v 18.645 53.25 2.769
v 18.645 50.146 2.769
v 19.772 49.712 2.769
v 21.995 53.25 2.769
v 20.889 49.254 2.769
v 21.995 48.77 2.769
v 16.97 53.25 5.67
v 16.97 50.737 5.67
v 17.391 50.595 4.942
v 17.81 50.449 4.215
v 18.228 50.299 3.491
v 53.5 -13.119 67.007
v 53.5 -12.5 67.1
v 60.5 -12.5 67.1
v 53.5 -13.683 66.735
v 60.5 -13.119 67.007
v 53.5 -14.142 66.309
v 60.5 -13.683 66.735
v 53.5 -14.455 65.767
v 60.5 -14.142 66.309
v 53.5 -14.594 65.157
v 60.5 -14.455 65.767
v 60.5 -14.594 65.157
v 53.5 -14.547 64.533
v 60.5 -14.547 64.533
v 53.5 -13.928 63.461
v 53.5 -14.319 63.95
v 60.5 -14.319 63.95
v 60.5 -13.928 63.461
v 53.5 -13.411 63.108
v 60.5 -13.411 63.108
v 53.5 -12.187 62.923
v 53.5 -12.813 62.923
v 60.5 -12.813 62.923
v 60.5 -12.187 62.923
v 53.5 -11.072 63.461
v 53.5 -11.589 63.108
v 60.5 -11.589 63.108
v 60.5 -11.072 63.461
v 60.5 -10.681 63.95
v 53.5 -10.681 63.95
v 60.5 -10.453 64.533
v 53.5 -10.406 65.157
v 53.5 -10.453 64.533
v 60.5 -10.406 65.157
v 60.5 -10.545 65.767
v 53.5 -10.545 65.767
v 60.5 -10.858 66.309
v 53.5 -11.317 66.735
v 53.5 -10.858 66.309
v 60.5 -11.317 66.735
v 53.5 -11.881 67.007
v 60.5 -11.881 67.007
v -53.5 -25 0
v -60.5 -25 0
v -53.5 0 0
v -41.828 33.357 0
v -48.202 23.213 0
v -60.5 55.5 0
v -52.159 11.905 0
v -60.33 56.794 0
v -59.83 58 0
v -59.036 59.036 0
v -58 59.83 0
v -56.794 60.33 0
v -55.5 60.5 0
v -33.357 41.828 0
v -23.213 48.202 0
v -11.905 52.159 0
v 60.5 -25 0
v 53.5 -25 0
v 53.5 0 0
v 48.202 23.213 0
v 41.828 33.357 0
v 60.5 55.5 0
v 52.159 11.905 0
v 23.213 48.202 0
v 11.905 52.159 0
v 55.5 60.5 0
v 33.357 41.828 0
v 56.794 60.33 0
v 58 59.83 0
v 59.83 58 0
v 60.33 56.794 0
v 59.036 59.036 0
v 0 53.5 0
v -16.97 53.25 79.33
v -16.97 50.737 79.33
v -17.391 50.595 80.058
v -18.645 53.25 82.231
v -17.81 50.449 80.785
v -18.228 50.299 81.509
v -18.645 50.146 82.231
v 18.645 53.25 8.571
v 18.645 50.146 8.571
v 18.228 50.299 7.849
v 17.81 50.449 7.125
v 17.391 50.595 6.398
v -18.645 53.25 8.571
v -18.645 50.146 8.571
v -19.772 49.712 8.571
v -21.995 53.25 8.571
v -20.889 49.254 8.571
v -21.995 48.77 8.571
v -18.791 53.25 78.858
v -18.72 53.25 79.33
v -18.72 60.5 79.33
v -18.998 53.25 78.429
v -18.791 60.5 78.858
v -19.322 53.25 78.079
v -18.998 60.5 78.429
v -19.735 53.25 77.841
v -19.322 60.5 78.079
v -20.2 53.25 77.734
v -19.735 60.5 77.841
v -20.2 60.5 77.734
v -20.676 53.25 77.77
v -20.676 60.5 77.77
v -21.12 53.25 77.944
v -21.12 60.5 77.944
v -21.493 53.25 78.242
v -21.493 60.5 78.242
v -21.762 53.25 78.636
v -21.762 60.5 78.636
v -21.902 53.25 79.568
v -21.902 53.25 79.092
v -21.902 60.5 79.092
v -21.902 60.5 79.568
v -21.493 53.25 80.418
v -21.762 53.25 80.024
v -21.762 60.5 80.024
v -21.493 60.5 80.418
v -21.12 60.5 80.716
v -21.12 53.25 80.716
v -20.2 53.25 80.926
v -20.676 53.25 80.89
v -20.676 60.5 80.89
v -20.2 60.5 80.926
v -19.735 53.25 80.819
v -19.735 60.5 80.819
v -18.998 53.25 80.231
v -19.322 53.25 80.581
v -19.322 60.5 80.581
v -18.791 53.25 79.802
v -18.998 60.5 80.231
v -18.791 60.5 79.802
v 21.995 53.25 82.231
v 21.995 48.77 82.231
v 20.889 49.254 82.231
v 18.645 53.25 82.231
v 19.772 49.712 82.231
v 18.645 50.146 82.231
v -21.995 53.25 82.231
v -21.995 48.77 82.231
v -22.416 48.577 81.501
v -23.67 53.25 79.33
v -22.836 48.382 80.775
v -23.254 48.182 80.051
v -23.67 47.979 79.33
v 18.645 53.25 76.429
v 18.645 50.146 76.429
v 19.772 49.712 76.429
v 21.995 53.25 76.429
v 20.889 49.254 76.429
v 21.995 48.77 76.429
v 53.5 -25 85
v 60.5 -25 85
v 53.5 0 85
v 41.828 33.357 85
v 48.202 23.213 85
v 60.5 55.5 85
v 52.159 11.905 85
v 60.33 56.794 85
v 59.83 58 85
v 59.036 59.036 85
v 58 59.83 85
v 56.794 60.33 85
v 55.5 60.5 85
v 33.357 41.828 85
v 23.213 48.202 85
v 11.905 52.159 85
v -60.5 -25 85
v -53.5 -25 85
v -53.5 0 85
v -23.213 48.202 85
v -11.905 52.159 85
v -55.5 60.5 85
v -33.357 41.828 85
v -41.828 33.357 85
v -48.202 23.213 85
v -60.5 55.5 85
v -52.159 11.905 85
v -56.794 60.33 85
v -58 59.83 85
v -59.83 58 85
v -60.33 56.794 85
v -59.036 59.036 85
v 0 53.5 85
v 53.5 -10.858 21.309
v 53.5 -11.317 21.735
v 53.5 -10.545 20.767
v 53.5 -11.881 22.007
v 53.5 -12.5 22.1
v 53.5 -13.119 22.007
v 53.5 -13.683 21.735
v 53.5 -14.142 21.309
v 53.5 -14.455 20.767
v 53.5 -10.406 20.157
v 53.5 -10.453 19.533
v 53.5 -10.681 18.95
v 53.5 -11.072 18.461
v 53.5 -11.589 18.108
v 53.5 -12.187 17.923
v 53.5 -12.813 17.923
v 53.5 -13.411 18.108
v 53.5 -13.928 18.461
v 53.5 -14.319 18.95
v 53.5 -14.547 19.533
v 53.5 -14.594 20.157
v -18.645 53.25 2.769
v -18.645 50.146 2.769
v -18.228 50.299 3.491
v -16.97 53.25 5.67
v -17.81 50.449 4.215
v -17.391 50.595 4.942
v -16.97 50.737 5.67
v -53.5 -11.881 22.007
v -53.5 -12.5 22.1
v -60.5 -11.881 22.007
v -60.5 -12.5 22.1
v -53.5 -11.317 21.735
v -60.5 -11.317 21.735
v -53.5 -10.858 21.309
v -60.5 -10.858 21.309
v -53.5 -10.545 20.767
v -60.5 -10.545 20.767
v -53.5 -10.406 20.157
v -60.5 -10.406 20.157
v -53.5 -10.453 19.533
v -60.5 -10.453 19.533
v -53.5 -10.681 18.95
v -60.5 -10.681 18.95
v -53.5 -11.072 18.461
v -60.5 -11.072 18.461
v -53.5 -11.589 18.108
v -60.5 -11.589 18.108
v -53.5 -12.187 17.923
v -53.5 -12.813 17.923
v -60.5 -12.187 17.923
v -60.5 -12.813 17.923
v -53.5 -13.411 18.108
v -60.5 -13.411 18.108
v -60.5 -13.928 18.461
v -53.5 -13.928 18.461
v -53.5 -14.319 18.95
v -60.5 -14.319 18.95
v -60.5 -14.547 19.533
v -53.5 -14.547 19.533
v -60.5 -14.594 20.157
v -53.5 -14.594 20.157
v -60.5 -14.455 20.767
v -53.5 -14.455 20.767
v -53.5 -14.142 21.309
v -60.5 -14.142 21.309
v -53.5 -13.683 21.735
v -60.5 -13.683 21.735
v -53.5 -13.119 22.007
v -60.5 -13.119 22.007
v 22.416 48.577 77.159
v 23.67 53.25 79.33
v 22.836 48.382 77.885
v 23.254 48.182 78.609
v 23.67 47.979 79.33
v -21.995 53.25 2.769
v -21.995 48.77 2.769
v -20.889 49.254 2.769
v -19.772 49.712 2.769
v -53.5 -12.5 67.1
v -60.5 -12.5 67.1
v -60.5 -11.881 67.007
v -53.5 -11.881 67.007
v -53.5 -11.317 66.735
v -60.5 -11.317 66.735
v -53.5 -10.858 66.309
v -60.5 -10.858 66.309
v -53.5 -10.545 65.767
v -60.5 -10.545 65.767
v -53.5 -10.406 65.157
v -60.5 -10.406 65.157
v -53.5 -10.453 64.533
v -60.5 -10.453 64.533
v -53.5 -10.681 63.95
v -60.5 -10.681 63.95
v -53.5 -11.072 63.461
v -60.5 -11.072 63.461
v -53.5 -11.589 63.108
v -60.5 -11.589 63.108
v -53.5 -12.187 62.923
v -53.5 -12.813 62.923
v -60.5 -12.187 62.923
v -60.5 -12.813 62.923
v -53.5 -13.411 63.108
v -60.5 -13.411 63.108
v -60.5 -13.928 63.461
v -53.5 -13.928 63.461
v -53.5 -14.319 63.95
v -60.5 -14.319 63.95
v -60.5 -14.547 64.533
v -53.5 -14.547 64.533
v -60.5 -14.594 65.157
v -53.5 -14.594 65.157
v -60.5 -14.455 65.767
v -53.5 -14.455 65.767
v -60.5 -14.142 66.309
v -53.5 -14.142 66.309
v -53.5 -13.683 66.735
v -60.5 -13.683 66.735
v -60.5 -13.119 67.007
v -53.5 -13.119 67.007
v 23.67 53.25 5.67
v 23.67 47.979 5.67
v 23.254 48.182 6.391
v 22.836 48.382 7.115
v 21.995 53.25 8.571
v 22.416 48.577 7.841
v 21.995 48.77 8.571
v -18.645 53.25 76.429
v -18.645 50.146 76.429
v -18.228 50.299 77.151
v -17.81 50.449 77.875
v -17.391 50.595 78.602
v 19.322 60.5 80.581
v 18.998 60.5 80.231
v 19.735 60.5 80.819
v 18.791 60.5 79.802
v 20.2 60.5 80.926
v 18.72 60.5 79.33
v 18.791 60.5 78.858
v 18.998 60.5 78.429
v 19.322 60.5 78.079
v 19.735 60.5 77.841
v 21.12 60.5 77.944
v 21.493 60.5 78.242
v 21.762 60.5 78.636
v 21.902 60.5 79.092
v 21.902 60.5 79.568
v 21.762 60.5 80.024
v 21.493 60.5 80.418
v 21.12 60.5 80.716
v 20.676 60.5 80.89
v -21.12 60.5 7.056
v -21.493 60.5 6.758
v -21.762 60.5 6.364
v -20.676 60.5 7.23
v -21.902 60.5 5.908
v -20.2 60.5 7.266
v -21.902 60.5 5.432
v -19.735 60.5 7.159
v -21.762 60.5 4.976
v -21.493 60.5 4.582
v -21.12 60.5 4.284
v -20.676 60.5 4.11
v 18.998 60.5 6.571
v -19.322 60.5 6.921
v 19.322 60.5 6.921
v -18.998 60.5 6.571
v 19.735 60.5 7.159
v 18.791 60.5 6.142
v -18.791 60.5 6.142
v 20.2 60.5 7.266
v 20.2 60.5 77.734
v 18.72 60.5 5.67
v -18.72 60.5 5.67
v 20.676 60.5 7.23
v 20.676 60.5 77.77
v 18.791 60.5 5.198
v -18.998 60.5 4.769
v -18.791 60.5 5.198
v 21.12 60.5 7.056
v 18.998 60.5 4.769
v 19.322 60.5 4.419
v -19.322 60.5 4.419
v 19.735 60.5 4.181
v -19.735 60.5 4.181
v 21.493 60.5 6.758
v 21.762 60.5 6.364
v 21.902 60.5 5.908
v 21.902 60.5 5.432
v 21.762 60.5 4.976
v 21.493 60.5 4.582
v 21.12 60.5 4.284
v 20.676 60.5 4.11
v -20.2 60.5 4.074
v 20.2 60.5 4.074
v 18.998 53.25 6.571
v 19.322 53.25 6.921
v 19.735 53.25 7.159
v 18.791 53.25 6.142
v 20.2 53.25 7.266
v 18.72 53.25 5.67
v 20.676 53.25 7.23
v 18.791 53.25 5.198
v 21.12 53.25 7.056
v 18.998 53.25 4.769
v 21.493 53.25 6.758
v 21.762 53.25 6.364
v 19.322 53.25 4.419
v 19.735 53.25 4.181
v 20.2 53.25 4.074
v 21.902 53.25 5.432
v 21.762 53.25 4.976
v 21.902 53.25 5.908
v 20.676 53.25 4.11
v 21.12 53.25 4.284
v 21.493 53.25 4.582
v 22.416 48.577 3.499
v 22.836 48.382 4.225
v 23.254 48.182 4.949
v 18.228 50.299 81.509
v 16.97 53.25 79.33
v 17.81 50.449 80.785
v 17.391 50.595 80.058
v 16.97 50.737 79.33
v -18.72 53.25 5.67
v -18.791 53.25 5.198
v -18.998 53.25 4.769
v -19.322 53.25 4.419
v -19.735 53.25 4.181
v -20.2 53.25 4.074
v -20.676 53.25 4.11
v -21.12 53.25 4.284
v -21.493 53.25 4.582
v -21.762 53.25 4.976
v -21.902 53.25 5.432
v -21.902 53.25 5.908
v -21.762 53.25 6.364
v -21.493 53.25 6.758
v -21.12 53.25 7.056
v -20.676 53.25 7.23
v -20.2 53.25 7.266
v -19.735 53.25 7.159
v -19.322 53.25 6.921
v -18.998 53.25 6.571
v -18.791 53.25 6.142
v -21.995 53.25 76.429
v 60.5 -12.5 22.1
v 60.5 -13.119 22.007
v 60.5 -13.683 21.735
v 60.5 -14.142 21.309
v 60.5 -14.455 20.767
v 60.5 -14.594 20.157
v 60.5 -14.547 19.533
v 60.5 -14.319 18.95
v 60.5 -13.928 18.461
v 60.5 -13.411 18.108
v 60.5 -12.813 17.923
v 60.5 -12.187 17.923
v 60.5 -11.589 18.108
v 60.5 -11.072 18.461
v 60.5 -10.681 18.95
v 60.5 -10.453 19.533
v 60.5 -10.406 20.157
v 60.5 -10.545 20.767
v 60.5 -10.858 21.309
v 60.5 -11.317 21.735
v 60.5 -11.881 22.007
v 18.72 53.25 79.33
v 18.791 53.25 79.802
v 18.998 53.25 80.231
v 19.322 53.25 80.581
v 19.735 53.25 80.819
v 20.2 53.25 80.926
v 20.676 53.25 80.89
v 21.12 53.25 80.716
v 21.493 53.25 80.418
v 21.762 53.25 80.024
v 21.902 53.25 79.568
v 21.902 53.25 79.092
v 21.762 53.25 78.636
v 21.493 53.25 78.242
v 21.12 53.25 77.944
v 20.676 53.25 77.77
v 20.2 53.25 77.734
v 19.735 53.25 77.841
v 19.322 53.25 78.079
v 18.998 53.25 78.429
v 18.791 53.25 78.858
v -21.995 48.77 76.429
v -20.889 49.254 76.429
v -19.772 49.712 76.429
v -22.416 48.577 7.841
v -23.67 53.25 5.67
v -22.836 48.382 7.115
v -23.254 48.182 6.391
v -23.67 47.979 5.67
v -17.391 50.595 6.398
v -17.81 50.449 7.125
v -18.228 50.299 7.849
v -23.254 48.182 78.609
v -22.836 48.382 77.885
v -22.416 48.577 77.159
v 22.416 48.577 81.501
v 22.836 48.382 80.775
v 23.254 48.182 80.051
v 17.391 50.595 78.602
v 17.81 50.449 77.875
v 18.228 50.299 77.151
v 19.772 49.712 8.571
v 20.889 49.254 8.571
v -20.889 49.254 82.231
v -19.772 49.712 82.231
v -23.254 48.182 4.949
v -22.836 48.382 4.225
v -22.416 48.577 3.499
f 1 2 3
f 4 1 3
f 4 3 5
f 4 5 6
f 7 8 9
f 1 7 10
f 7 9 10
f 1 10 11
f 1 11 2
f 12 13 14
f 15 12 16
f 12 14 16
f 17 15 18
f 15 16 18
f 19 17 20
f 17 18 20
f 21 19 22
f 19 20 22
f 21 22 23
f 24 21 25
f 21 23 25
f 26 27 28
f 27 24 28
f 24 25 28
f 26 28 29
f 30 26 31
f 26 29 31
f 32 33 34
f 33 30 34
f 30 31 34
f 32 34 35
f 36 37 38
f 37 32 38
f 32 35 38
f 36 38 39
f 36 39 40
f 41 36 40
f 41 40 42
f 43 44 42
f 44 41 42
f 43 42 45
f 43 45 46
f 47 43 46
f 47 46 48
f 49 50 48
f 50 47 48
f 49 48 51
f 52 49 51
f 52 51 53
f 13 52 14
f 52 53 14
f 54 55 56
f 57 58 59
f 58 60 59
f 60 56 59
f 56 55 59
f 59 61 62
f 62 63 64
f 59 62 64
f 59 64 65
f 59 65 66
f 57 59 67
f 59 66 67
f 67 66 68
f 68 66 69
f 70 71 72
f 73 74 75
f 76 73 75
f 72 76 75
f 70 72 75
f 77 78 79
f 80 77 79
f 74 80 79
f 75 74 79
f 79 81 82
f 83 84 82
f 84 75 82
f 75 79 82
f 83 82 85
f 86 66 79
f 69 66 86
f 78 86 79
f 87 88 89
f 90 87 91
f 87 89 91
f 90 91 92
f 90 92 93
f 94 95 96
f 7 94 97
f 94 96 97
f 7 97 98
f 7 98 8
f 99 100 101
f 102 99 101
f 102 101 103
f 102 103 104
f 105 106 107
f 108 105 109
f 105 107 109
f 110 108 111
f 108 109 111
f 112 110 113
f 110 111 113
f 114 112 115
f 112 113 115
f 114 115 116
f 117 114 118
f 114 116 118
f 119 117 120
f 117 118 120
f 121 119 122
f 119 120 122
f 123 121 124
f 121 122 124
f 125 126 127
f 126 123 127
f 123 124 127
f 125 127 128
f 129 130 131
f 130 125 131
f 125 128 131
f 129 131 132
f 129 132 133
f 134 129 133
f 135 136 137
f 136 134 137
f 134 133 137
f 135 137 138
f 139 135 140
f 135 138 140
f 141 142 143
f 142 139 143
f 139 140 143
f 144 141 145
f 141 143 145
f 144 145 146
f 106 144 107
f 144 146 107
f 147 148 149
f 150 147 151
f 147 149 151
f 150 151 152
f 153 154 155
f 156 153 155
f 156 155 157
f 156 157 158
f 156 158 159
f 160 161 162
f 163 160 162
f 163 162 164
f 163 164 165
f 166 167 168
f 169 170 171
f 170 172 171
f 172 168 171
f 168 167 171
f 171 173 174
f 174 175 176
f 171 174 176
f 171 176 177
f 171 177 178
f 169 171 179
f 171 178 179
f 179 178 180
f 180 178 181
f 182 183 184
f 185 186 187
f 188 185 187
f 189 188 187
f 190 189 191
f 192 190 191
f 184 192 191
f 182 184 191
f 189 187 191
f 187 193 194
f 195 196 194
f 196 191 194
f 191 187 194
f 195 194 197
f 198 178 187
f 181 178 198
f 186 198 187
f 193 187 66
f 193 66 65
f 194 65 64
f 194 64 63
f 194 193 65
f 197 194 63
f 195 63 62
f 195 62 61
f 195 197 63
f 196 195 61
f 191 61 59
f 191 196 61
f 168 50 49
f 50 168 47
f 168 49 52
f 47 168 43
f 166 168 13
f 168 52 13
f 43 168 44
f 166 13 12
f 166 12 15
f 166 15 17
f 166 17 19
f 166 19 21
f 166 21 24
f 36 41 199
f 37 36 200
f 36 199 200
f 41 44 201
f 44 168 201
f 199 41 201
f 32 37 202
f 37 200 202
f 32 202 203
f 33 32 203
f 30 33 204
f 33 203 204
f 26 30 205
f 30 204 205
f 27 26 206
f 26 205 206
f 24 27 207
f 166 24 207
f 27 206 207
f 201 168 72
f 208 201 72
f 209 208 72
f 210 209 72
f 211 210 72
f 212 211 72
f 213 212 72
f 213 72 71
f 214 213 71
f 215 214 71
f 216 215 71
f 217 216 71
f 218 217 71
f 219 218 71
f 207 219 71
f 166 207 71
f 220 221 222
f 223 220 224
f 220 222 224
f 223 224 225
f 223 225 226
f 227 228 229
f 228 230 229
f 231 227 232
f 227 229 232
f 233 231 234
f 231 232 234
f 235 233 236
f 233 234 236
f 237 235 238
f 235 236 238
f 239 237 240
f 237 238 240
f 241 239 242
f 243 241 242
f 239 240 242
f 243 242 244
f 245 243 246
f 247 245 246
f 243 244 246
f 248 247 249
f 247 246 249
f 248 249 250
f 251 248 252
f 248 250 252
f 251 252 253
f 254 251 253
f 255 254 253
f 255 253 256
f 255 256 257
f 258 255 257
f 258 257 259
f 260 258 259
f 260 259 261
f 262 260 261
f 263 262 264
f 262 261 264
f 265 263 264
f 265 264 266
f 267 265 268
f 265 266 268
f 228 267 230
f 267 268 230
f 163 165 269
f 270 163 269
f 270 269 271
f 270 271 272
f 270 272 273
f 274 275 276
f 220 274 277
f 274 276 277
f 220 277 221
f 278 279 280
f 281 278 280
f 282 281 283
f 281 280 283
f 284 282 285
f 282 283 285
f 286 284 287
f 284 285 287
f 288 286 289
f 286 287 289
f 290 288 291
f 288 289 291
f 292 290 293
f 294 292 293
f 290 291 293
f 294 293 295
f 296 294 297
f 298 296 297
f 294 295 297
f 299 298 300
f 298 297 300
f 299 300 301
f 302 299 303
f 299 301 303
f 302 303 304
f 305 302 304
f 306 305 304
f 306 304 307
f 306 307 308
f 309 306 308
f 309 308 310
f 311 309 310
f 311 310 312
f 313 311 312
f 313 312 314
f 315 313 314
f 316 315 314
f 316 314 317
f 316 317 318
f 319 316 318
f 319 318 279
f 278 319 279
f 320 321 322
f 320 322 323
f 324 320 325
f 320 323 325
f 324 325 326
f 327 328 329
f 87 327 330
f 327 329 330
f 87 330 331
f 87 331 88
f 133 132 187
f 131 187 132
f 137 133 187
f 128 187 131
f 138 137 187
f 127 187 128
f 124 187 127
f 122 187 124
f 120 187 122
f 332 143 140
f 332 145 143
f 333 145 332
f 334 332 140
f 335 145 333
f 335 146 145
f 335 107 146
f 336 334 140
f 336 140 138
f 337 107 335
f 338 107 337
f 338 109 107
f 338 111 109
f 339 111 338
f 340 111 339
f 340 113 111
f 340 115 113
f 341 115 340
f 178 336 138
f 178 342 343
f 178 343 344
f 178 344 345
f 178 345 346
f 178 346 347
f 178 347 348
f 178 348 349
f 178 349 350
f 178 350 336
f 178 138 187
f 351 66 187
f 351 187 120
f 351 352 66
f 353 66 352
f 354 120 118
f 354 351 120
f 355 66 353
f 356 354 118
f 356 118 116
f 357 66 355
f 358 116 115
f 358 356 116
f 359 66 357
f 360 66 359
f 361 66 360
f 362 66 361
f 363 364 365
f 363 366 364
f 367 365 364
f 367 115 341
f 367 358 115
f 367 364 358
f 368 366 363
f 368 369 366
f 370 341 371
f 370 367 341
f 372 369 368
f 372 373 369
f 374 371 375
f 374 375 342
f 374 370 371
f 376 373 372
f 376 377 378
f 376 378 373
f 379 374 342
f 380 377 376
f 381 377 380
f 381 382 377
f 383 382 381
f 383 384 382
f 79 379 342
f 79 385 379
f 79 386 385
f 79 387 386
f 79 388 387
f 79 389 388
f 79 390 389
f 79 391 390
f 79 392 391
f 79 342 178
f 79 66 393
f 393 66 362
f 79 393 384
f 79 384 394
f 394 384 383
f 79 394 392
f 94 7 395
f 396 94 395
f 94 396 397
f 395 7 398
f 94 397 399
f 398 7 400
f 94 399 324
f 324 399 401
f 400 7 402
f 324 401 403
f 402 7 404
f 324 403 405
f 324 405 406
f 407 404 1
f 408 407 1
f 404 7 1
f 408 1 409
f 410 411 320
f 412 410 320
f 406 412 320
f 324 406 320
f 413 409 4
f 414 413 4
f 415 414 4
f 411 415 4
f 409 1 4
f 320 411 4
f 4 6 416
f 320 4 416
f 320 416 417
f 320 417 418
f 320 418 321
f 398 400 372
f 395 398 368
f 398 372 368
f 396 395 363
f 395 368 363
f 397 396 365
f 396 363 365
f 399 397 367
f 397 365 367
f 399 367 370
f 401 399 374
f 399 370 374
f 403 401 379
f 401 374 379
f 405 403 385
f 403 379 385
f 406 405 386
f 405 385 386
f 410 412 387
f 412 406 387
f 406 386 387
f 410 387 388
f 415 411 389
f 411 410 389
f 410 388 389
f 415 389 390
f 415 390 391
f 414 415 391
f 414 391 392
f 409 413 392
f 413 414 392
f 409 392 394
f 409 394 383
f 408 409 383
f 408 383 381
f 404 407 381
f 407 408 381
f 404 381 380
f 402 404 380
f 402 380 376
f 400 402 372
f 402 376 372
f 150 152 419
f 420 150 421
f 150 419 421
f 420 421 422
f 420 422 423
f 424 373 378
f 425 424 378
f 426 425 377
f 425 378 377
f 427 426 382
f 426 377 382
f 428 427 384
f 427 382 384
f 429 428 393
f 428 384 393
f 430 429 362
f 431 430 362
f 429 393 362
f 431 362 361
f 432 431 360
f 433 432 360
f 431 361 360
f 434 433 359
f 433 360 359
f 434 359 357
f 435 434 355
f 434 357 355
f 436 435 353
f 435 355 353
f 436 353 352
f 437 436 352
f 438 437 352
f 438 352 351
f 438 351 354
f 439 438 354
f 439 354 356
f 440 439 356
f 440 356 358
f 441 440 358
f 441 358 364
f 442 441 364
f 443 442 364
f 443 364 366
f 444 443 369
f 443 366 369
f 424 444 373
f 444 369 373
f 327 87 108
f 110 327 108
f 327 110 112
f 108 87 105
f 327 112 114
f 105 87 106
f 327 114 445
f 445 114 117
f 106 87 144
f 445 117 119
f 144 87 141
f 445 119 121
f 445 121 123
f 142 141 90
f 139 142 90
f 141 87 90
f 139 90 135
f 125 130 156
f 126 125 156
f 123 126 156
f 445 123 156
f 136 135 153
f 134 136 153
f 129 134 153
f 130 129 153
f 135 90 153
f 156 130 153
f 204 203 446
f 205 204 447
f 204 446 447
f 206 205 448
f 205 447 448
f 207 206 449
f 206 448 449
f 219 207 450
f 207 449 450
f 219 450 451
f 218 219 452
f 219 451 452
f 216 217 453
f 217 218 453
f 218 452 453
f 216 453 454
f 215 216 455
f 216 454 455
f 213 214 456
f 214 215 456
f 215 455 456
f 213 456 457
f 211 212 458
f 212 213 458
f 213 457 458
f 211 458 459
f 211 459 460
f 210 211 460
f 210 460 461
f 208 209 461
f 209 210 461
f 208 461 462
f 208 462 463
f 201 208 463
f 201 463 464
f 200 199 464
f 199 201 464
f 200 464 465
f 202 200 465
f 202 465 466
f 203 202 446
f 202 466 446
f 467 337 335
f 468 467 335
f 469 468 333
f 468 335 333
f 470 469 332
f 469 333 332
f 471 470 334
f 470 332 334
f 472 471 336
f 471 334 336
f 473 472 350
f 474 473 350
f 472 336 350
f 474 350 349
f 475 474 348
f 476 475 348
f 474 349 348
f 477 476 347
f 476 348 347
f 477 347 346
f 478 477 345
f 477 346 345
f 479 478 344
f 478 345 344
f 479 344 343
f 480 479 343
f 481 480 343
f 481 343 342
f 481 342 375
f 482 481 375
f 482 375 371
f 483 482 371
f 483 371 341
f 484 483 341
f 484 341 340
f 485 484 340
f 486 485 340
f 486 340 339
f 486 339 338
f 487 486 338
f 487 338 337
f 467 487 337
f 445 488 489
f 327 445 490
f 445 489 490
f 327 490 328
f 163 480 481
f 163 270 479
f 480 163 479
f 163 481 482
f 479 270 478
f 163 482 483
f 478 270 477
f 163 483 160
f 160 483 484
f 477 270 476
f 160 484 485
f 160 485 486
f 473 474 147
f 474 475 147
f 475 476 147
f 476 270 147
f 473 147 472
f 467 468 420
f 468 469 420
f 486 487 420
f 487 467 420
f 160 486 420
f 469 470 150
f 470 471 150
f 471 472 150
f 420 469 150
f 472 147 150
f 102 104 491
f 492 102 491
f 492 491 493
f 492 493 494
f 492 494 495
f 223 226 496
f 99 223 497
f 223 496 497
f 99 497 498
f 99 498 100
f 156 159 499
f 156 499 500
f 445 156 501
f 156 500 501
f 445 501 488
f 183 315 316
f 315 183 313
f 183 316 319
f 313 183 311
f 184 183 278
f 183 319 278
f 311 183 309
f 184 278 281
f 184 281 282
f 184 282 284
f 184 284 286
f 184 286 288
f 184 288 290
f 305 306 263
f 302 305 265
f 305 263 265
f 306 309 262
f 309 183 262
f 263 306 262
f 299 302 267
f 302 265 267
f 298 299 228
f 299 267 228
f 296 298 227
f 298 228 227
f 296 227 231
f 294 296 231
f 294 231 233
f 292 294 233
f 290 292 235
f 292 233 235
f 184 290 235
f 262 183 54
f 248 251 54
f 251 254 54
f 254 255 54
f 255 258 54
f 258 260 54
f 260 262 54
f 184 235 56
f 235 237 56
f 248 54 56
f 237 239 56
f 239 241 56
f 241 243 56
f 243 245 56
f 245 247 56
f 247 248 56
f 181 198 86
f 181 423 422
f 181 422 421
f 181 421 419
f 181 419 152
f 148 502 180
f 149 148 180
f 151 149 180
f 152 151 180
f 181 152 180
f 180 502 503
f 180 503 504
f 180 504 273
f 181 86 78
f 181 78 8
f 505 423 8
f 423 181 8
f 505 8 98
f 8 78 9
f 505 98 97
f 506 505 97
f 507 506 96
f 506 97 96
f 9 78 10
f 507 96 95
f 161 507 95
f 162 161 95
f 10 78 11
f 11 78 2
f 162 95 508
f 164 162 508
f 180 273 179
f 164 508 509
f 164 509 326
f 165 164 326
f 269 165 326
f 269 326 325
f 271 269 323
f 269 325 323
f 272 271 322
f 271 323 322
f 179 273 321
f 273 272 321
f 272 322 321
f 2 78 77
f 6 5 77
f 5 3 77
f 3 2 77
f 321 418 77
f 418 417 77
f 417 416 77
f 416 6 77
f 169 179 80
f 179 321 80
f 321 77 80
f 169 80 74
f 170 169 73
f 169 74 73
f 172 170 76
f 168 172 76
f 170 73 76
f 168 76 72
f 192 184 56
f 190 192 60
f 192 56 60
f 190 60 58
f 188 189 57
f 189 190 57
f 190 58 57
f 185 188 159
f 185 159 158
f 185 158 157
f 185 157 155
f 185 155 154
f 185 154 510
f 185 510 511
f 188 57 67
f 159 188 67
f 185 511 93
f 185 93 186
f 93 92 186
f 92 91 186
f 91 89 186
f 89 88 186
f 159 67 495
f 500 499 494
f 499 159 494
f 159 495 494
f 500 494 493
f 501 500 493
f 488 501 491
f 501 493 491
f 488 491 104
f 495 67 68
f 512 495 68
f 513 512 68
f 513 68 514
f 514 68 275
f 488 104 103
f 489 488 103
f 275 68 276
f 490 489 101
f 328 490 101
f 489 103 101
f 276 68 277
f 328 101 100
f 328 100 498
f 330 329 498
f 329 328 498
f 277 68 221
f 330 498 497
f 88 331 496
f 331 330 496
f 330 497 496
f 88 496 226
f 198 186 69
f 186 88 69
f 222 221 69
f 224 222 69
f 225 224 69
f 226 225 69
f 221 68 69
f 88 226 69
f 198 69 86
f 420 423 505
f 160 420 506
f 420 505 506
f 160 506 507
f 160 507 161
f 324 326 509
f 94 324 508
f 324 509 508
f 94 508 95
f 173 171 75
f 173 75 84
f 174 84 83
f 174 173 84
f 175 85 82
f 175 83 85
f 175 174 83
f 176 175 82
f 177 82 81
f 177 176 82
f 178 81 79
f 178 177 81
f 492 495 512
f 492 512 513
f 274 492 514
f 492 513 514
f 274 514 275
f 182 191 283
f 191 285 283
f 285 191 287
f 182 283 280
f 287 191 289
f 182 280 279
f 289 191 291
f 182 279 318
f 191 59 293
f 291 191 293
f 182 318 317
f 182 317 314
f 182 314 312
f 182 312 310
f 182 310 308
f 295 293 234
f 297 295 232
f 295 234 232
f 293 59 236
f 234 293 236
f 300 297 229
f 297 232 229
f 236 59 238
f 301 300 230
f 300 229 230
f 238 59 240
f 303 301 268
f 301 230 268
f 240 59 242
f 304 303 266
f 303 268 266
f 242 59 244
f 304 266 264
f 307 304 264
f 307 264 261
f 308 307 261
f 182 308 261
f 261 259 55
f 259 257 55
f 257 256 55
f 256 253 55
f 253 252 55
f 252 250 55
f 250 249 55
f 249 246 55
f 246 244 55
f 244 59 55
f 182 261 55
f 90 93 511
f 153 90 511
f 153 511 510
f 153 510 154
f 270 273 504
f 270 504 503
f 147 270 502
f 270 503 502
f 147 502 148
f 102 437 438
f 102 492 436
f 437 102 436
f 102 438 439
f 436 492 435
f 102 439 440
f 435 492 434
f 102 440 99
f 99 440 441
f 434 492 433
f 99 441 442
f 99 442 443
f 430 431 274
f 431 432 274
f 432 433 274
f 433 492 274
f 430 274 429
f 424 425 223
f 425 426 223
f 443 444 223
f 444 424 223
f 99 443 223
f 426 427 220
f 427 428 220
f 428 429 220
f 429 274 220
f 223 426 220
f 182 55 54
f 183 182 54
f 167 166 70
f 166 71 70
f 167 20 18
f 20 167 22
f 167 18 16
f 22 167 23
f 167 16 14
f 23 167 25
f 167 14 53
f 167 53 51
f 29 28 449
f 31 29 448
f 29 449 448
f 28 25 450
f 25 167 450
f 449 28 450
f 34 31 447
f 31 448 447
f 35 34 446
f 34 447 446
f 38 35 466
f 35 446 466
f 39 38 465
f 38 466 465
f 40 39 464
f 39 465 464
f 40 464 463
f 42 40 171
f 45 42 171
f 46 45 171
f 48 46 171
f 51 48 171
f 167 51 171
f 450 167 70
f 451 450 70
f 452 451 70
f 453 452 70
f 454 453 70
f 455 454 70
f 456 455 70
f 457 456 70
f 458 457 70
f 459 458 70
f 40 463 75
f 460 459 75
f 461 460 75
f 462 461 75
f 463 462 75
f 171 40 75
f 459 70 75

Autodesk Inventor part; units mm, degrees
ref_plane "YZ Plane" through (0, 0, 0) normal (1, 0, 0) x (0, 1, 0)
ref_plane "XZ Plane" through (0, 0, 0) normal (0, 1, 0) x (-1, 0, 0)
ref_plane "XY Plane" through (0, 0, 0) normal (0, 0, 1) x (1, 0, 0)
sketch "スケッチ1" plane through (0, 0, 0) normal (0, 0, 1) x (1, 0, 0)
  arc A0 (0, 53.5) -> (-53.5, 0) centre (0, 0) ccw
  line L0 (-60.5, 0) -> (-60.5, 60.5)
  line L1 (-60.5, 60.5) -> (0, 60.5)
  line L2 (0, 60.5) -> (0, -99.4363)
  line L3 (-60.5, 0) -> (-60.5, -25)
  line L4 (-60.5, -25) -> (-53.5, -25)
  line L5 (-53.5, -25) -> (-53.5, 0)
  dimension "d0" = 107
  dimension "d3" = 25
extrude "押し出し1" add sketch "スケッチ1" along normal blind 85
sketch "スケッチ2" plane through (-60.5, 60.5, 0) normal (0, 1, 0) x (1, 0, 0)
  line L0 (60.5, -85) -> (7, -85) projected
  line L1 (60.5, -85) -> (60.5, -42.5)
  line L2 (60.5, 0) -> (60.5, -85) projected
  line L3 (60.5, -42.5) -> (40.18, -42.5)
  line L4 (40.18, -42.5) -> (40.18, -5.67)
  line L5 (40.18, -42.5) -> (40.18, -79.33)
  circle A0 centre (40.18, -5.67) radius 1.6
  circle A1 centre (40.18, -79.33) radius 1.6
  line L6 (60.5, -42.5) -> (-11.6627, -42.5)
  line L7 (-11.6627, -42.5) -> (-11.6627, -99.0684)
  line L8 (-11.6627, -99.0684) -> (60.5, -99.0684)
  line L9 (60.5, -99.0684) -> (60.5, -42.5)
  dimension "d8" = 20.32
  dimension "d9" = 36.83
  dimension "d10" = 36.83
  dimension "d11" = 3.2
  dimension "d12" = 3.2
extrude "押し出し2" cut sketch "スケッチ2" against normal through all contours A1 | A0
ref_plane "作業平面1" through (-60.5, 42.25, 0) normal (0, 1, 0) x (1, 0, 0)
sketch "スケッチ3" plane through (-60.5, 42.25, 0) normal (0, 1, 0) x (1, 0, 0)
  circle A0 centre (40.18, -5.67) radius 1.6 projected
  line L0 (43.53, -5.67) -> (41.855, -8.5712)
  line L1 (41.855, -8.5712) -> (38.505, -8.5712)
  line L2 (38.505, -8.5712) -> (36.83, -5.67)
  line L3 (36.83, -5.67) -> (38.505, -2.7688)
  line L4 (38.505, -2.7688) -> (41.855, -2.7688)
  line L5 (41.855, -2.7688) -> (43.53, -5.67)
  point P0 (60.5, 0)
  dimension "d16" = 6.7
extrude "押し出し3" cut sketch "スケッチ3" along normal blind 11
extrude "押し出し4" cut sketch "スケッチ2" against normal through all contours L9 L8 L7 L6 L3 L1
mirror "ミラー1" about plane through (-72.1627, 60.5, 42.5) normal (0, 0, 1)
sketch "スケッチ4" plane through (-60.5, -25, 0) normal (-1, 0, 0) x (0, 0, 1)
  line L0 (85, 78.5) -> (0, 78.5) projected
  line L1 (0, 78.5) -> (85, 78.5)
  line L2 (85, 25) -> (0, 25) projected
  line L3 (0, 25) -> (85, 25)
  line L4 (0, 25) -> (0, 12.5)
  line L5 (0, 85.5) -> (0, 0) projected
  line L6 (0, 12.5) -> (85, 12.5)
  line L7 (85, 0) -> (85, 25) projected
  circle A0 centre (20, 12.5) radius 2.1
  line L8 (85, 12.5) -> (65, 12.5)
  circle A1 centre (65, 12.5) radius 2.1
  dimension "d21" = 12.5
  dimension "d22" = 4.2
  dimension "d23" = 20
  dimension "d24" = 20
  dimension "d25" = 4.2
extrude "押し出し5" cut sketch "スケッチ4" against normal blind 10 contours A1 L6 | L6 A1 | A0 L6 | L6 A0
fillet "フィレット1" radius 5 1 edges at (-60.5, 60.5, 42.5)
mirror "ミラー2" about plane through (0, 53.5, 0) normal (1, 0, 0)
properties part number "mainIMU"
